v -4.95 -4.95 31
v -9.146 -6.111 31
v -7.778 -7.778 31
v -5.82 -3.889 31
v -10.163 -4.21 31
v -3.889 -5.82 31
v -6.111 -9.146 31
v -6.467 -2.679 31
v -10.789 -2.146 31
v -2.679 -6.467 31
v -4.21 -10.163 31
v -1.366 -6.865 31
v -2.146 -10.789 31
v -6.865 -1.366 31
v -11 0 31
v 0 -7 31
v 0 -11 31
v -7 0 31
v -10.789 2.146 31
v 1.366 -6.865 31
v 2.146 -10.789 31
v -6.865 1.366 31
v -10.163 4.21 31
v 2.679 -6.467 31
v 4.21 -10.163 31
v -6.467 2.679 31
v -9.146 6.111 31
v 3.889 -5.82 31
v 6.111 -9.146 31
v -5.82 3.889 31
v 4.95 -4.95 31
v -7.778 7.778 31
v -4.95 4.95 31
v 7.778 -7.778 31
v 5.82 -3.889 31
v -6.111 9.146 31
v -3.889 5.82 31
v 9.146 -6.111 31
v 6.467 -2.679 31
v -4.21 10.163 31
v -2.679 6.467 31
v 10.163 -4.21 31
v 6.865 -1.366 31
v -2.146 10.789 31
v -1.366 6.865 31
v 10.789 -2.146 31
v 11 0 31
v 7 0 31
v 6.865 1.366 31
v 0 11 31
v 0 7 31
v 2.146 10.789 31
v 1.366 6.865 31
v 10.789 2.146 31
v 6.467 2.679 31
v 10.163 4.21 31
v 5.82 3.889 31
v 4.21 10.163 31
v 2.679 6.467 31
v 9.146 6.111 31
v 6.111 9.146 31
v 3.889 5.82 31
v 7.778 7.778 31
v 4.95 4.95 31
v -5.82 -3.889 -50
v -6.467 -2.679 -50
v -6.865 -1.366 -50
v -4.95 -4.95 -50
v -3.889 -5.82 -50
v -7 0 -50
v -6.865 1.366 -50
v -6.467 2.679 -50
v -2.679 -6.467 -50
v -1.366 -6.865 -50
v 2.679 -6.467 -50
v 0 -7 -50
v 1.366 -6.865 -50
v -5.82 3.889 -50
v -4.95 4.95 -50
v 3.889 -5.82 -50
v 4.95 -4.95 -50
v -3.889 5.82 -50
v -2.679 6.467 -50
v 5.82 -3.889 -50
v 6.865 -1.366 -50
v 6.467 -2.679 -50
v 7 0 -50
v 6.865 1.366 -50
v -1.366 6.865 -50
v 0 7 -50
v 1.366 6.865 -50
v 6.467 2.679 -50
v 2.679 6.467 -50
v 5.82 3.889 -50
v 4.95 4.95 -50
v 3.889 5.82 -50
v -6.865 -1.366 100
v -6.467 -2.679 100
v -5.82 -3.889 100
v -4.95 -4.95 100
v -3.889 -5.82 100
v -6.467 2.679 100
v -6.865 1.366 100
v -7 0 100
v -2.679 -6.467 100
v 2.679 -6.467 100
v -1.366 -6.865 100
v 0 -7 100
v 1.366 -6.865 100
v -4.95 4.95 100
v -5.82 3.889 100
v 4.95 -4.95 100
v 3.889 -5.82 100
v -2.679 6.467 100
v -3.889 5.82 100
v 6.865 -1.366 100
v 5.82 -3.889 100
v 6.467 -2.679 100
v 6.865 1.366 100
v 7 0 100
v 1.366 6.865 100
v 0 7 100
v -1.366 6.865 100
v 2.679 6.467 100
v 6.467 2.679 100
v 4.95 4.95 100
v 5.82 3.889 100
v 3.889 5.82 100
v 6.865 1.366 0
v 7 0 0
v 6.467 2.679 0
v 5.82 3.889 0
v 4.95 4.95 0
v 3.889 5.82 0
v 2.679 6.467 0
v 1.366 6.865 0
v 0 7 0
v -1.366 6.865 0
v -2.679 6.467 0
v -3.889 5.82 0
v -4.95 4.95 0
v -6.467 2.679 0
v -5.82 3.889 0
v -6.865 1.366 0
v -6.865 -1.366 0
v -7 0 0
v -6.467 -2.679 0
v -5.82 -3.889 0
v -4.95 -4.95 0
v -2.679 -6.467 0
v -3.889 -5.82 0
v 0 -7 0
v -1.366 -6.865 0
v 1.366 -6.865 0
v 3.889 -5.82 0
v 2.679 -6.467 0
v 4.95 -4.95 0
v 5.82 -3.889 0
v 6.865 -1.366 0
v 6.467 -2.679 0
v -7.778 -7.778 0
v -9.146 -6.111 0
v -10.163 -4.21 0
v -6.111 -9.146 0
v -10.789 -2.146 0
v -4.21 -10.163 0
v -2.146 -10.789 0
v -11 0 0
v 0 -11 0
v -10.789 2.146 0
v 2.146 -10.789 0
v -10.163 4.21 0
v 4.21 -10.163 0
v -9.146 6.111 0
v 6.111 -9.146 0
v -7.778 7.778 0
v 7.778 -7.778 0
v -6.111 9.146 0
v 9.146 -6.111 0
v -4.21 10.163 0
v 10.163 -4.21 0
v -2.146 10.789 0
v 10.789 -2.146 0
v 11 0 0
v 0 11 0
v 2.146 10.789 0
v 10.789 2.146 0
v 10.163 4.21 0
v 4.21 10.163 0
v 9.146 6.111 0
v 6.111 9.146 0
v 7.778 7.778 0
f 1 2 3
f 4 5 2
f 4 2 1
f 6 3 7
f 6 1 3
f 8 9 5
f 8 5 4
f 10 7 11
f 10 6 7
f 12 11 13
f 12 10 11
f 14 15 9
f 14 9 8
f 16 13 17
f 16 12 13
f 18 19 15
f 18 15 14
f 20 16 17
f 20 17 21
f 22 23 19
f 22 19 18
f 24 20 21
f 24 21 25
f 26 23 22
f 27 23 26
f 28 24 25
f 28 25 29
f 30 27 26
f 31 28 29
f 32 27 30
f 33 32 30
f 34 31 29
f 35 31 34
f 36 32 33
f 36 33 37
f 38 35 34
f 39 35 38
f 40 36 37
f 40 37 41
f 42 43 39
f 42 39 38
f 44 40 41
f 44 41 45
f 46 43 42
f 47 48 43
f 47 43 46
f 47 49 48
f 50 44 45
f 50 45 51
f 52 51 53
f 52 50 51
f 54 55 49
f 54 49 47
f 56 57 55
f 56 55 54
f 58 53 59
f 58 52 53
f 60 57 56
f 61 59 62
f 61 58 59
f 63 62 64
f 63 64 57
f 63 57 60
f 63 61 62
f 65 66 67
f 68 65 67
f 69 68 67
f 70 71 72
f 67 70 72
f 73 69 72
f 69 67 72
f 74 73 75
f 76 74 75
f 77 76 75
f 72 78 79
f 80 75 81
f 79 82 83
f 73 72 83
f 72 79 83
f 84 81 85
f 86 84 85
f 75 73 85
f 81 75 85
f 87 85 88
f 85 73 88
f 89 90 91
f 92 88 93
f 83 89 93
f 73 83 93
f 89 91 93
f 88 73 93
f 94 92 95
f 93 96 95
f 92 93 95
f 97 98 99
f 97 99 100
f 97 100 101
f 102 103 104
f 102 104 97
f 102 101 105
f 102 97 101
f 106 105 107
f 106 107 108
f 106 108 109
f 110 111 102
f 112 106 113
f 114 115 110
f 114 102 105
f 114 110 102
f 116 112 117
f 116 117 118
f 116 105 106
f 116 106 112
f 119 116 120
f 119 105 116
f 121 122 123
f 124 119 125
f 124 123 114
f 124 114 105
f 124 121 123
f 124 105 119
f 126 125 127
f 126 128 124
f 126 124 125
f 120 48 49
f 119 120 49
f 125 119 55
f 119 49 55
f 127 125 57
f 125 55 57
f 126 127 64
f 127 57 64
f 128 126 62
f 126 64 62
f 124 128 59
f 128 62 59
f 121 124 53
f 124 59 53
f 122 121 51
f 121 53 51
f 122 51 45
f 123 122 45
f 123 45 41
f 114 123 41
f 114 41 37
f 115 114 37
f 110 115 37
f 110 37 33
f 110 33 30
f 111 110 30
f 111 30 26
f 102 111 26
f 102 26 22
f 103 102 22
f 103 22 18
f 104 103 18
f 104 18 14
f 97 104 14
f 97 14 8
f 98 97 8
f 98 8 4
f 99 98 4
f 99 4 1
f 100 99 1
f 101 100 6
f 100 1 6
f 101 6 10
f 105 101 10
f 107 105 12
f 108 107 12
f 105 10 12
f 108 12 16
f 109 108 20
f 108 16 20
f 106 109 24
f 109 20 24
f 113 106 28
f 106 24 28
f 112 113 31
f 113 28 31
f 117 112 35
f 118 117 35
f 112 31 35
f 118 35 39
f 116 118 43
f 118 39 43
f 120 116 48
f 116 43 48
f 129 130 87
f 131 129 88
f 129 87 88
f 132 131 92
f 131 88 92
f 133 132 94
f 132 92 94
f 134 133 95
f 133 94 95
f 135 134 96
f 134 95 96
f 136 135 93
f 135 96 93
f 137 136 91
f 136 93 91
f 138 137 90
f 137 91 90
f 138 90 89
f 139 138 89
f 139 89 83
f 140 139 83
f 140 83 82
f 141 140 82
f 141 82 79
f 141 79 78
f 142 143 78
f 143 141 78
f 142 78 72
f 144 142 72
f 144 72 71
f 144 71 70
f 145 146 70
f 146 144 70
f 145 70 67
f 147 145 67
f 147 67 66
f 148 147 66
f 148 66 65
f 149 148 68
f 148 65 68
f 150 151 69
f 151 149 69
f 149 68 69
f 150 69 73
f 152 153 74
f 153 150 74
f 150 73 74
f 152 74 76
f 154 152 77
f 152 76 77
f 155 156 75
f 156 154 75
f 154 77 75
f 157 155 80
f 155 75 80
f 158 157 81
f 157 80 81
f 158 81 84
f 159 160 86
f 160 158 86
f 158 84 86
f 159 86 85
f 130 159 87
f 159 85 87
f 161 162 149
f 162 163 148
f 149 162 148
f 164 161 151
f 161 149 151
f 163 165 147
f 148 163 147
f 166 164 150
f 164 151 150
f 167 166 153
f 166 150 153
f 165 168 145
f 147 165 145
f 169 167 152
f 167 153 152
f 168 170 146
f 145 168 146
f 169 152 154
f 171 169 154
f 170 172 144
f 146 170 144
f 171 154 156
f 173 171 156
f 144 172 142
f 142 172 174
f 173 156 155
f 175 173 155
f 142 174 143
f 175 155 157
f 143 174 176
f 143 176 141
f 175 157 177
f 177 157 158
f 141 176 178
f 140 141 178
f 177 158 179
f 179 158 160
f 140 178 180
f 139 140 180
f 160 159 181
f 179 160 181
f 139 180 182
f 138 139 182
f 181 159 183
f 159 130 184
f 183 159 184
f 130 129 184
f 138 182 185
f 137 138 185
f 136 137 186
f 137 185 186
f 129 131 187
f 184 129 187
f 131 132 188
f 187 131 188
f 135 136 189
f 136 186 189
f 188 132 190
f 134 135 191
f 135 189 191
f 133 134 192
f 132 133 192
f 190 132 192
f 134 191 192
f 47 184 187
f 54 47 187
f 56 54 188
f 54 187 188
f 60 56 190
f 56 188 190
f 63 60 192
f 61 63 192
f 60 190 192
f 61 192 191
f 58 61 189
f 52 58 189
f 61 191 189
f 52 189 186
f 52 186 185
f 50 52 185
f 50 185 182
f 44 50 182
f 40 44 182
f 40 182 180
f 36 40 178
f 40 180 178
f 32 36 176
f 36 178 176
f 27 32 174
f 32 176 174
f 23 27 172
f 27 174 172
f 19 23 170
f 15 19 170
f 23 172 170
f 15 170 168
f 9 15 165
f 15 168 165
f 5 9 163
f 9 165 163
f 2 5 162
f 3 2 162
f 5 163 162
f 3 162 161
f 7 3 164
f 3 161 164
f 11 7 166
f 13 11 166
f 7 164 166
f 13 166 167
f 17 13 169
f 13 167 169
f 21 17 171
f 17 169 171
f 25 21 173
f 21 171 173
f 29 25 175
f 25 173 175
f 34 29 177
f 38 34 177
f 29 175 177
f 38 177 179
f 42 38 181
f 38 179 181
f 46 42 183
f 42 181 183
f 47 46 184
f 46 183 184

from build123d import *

# Parameters (mm, degrees)
CYLINDER004_R     = 7
CYLINDER004_DEPTH = 150
CYLINDER003_R     = 11
CYLINDER003_DEPTH = 31


with BuildPart() as axe:
    # Cylinder004 → Cylinder004 (new body)
    with BuildSketch(Plane.XY.offset(-50)):
        Circle(CYLINDER004_R)
    extrude(amount=CYLINDER004_DEPTH)


with BuildPart() as ball_slider:
    # Cylinder003 → Cylinder003 (new body)
    with BuildSketch(Plane.XY):
        Circle(CYLINDER003_R)
    extrude(amount=CYLINDER003_DEPTH)

    # Fusion003: union axe
    add(axe.part)


solid = ball_slider.part
